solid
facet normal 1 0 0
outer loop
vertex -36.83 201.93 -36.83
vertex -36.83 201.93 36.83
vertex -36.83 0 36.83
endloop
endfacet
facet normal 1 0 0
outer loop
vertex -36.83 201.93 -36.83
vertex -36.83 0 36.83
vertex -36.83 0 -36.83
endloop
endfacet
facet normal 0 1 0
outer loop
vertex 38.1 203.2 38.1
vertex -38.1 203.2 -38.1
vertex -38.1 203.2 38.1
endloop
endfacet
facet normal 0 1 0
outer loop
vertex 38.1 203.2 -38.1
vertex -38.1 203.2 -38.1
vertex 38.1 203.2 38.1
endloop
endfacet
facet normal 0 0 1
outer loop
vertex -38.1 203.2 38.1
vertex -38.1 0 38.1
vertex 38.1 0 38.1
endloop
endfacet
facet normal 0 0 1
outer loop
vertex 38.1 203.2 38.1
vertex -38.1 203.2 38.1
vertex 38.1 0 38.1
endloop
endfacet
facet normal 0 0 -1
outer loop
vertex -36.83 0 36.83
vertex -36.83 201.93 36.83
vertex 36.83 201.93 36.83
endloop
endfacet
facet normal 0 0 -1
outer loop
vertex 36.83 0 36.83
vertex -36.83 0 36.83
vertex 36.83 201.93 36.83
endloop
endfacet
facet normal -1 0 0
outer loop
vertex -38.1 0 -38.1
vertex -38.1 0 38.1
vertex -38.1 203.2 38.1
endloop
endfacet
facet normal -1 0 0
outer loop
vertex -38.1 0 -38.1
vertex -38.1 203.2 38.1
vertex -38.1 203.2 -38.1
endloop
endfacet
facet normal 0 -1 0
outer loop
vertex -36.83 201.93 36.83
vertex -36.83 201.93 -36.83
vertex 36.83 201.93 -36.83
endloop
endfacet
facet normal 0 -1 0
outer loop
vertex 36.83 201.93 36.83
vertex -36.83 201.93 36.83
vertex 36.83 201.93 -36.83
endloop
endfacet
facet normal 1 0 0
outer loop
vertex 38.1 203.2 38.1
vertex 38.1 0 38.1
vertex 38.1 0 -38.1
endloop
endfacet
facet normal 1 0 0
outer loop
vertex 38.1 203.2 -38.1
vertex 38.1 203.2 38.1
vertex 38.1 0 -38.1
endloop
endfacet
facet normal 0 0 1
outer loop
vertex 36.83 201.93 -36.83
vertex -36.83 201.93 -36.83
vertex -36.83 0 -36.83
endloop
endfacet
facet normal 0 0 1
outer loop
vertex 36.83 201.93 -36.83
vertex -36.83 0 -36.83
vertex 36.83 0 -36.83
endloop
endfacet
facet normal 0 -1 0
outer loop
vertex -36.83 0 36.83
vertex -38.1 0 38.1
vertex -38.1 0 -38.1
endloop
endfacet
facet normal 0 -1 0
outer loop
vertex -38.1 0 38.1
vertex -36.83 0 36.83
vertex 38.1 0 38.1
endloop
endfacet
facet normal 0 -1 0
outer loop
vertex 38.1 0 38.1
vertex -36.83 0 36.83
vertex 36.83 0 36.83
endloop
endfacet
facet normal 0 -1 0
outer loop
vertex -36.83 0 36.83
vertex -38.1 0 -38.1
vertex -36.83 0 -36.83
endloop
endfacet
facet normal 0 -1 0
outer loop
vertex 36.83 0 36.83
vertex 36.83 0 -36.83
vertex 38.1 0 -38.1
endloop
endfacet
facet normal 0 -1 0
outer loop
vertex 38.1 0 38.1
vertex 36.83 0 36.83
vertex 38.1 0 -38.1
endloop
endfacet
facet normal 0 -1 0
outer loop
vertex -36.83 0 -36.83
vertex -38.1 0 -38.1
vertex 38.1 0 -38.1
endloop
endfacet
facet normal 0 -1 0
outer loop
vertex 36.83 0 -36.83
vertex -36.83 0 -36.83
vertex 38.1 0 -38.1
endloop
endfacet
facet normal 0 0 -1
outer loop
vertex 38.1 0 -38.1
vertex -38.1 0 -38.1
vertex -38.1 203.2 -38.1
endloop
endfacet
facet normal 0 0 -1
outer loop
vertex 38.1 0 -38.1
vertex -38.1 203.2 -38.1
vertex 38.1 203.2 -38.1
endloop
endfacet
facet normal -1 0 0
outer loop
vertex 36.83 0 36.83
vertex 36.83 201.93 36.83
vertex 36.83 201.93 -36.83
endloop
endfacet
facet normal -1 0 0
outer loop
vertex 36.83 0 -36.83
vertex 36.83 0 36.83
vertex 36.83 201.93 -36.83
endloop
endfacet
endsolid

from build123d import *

# Parameters (mm, degrees)
SKETCH2_W           = 76.2
SKETCH2_H           = 76.2
SKETCH2_W_2         = 73.66
SKETCH2_H_2         = 73.66
BOSS_EXTRUDE1_DEPTH = 203.2
SKETCH3_W           = 73.66
SKETCH3_H           = 73.66
BOSS_EXTRUDE2_DEPTH = 1.27


with BuildPart() as part:
    # Sketch2 → Boss-Extrude1 (new body)
    with BuildSketch(Plane(origin=(0, 0, 0), x_dir=(1, 0, 0), z_dir=(0, 1, 0))):
        Rectangle(SKETCH2_W, SKETCH2_H)
        Rectangle(SKETCH2_W_2, SKETCH2_H_2, mode=Mode.SUBTRACT)
    extrude(amount=BOSS_EXTRUDE1_DEPTH)

    # Sketch3 → Boss-Extrude2 (add)
    with BuildSketch(Plane(origin=(0, 203.2, 0), x_dir=(1, 0, 0), z_dir=(0, 1, 0))):
        Rectangle(SKETCH3_W, SKETCH3_H)
    extrude(amount=-BOSS_EXTRUDE2_DEPTH)


solid = part.part
